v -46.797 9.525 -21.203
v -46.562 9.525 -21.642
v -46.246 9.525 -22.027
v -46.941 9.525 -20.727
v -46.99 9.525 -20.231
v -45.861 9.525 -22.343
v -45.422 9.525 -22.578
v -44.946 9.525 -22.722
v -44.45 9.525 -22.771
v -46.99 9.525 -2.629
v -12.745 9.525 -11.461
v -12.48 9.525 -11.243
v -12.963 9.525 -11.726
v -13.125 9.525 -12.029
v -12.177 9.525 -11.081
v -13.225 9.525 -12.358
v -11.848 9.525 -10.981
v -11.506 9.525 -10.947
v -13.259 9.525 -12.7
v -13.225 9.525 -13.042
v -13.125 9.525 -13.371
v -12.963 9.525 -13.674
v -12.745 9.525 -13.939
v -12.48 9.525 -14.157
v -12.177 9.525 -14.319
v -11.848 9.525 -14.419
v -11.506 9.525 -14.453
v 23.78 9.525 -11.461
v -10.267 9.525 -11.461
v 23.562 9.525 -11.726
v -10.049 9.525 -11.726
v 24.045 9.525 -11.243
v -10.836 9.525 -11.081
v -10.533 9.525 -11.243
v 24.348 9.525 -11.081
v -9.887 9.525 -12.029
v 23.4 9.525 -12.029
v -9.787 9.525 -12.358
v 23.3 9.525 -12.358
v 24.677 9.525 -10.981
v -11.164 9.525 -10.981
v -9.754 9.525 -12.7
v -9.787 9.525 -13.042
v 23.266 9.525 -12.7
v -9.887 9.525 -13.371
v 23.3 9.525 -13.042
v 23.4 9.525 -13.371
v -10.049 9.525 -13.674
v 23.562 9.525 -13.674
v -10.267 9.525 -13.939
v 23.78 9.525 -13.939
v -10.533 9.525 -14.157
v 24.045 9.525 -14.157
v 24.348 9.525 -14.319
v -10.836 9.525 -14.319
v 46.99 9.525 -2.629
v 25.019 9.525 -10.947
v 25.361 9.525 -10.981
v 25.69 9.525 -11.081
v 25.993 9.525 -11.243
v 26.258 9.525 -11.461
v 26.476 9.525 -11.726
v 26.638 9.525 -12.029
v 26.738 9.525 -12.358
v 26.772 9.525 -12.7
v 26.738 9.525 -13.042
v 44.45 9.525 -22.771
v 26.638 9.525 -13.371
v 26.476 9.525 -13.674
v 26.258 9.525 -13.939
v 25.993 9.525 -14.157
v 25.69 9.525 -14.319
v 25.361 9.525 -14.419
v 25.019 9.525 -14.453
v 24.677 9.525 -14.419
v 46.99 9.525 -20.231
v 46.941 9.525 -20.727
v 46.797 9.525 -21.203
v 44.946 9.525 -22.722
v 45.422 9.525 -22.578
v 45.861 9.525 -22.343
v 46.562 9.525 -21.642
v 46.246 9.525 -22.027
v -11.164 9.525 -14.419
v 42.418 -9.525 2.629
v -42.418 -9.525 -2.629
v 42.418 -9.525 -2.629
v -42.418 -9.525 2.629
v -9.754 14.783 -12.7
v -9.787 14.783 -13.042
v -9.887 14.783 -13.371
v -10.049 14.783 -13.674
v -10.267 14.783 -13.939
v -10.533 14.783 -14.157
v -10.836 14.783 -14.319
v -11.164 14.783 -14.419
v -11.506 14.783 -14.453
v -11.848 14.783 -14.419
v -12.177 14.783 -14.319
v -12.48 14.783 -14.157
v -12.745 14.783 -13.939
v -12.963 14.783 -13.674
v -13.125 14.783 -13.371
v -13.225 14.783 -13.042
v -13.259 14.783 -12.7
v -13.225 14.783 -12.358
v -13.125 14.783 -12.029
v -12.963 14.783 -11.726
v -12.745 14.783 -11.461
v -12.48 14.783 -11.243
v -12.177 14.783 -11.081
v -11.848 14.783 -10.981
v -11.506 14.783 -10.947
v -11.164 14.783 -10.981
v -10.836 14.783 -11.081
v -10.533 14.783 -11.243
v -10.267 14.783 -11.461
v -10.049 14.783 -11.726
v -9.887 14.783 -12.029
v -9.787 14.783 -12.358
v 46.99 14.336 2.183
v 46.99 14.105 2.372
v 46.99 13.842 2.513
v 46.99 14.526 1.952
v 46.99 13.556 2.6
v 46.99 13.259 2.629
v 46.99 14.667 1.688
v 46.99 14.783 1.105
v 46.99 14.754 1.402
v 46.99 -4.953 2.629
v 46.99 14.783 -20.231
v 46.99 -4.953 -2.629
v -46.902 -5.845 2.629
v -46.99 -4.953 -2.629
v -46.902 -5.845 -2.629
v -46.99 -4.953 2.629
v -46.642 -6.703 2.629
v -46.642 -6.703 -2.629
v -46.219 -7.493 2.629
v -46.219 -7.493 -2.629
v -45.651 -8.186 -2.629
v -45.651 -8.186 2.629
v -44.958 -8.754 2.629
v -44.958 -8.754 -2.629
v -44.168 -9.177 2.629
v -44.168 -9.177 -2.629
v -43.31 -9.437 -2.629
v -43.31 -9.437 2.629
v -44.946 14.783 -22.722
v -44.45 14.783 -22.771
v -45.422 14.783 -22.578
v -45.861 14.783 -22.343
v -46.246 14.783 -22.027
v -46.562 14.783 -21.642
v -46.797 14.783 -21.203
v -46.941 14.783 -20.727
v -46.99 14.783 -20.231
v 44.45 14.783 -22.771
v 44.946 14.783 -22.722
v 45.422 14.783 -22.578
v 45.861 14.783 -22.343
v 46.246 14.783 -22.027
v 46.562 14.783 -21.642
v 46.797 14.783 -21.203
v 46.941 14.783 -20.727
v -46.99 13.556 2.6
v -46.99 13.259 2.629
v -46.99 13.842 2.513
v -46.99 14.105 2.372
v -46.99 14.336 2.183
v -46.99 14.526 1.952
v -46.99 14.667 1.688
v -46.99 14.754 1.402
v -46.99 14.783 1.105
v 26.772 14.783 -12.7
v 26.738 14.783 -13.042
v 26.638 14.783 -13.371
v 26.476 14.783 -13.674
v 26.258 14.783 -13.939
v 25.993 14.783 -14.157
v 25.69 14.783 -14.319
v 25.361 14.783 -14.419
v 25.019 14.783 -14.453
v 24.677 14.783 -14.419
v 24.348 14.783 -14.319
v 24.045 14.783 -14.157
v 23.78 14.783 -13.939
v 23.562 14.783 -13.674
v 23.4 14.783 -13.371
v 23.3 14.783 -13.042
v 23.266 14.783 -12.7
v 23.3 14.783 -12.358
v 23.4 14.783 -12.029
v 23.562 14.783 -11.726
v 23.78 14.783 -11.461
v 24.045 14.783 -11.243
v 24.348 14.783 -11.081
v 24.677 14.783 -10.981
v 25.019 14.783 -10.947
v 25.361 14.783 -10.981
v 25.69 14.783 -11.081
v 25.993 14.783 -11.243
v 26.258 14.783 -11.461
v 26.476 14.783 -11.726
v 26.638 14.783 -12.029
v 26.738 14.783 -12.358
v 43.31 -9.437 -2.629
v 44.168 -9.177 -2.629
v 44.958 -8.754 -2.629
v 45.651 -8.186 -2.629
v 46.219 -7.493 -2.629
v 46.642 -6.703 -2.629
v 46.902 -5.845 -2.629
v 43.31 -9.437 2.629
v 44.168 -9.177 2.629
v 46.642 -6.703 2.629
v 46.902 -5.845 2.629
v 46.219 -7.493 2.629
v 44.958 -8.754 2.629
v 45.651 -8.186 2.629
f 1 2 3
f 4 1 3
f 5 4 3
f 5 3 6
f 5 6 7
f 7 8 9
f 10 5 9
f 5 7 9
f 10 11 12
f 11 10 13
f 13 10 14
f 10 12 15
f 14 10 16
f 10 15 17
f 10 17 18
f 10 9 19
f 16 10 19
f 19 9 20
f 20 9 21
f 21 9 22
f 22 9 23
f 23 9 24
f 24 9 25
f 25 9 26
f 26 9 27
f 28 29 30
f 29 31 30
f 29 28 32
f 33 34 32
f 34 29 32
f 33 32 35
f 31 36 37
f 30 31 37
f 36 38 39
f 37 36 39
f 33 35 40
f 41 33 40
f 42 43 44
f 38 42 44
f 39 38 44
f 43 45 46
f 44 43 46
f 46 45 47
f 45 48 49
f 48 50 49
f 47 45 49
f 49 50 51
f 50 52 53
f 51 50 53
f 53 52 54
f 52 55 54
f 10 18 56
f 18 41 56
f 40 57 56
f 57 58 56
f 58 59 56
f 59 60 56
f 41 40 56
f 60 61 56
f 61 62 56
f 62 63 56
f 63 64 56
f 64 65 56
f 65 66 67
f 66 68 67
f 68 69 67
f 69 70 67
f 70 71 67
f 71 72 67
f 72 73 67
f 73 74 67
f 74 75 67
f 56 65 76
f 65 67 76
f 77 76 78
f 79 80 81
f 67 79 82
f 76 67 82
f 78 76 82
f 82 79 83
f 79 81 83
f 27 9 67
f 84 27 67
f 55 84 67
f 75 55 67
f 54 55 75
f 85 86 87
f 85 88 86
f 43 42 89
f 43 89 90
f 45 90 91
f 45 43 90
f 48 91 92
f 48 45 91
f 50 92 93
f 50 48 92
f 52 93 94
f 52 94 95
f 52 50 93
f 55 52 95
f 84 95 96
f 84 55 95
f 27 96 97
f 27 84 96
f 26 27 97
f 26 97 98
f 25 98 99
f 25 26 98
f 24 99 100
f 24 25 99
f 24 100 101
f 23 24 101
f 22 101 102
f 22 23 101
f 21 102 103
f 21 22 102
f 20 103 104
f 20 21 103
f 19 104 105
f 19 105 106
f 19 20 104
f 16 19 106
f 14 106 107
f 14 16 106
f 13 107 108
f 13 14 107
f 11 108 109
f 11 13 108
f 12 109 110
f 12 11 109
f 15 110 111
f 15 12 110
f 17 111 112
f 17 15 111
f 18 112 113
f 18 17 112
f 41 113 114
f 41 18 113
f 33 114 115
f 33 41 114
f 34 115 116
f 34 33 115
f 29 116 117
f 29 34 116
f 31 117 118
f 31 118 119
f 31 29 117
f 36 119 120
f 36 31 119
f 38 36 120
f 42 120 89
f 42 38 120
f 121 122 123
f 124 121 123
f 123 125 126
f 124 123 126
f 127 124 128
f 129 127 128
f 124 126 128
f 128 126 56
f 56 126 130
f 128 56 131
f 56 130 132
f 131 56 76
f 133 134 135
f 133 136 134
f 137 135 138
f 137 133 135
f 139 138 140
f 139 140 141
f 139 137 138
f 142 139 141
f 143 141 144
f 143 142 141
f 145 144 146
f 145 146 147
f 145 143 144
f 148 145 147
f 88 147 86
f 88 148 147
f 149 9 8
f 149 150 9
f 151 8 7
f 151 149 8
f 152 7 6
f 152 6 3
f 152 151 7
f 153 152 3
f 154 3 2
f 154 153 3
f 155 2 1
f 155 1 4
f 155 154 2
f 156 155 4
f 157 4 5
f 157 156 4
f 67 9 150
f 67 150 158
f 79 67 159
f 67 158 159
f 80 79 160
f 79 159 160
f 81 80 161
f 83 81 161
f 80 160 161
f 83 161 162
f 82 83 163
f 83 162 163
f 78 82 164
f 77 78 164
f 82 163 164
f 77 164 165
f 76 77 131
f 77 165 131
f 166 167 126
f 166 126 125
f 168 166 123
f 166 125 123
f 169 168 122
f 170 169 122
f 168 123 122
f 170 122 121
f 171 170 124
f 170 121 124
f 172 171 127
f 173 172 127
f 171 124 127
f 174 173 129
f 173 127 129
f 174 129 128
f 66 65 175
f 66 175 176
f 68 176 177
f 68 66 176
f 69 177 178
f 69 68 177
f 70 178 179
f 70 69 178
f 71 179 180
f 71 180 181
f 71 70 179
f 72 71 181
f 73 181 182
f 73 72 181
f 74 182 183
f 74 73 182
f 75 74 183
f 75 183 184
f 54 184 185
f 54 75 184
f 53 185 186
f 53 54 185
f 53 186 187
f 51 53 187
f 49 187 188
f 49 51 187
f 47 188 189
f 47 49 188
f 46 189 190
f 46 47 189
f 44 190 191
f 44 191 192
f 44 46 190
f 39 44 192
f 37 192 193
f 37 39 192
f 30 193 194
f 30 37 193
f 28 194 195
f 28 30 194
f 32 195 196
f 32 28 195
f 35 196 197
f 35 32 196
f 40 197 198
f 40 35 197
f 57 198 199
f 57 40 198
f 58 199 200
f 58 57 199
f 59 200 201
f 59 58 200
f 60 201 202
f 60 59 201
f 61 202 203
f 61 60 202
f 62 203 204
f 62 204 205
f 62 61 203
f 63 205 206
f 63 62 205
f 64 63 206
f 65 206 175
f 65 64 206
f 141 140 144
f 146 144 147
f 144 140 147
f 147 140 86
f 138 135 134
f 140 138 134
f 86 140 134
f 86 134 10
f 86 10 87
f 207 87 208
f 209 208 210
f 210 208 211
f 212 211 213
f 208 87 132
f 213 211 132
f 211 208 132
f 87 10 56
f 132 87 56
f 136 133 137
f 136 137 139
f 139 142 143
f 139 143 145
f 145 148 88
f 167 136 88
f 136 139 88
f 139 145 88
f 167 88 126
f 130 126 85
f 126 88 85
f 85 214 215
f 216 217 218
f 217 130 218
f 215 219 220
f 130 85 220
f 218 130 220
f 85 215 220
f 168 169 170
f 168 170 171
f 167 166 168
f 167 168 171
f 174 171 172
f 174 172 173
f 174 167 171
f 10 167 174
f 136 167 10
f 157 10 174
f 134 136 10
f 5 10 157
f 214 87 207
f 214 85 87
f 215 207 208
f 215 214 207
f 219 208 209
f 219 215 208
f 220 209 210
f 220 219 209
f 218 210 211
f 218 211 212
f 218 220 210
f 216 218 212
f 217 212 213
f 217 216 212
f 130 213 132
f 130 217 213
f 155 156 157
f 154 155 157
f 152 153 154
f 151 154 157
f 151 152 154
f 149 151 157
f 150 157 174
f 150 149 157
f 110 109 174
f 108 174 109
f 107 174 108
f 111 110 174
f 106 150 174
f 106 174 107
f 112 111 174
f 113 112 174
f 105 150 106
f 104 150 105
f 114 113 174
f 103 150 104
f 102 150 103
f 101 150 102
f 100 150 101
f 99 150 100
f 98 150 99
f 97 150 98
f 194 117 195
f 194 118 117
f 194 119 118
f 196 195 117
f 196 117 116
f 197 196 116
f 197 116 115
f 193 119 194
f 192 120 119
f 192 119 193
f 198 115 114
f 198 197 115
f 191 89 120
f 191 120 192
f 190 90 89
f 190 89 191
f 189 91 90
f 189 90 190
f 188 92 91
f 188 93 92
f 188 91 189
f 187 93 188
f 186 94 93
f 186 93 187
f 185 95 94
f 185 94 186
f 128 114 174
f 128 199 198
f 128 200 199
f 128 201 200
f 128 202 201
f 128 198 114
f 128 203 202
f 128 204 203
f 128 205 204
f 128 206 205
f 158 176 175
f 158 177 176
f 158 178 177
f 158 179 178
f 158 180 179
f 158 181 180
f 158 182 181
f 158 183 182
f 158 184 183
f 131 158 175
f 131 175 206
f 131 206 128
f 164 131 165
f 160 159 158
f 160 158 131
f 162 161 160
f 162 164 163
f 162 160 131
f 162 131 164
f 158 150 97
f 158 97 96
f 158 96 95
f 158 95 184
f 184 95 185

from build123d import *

# Parameters (mm, degrees)
SKETCH1_W           = 93.98
SKETCH1_H           = 19.05
BOSS_EXTRUDE1_DEPTH = 2.6289
SKETCH2_W           = 93.98
SKETCH2_H           = 25.4
BOSS_EXTRUDE2_DEPTH = 5.2578
FILLET6_R           = 4.572
FILLET7_R           = 4.572
FILLET8_R           = 1.524
FILLET9_R           = 2.54
FILLET10_R          = 2.54
CAVITY1_START       = 9.525
CAVITY1_OUTLINE_R   = 1.7526
CAVITY1_DEPTH       = 5.2578


# Read off the part's stored shape, not the designer's step: Cavity1
with BuildPart() as part:
    # Sketch1 → Boss-Extrude1 (new, symmetric)
    with BuildSketch(Plane.XY):
        Rectangle(SKETCH1_W, SKETCH1_H)
    extrude(amount=BOSS_EXTRUDE1_DEPTH, both=True)

    # Sketch2 → Boss-Extrude2 (add)
    with BuildSketch(Plane(origin=(0, 9.525, 0), x_dir=(1, 0, 0), z_dir=(0, 1, 0))):
        with Locations((0, 10.0711)):
            Rectangle(SKETCH2_W, SKETCH2_H)
    extrude(amount=BOSS_EXTRUDE2_DEPTH)

    # Fillet6
    fillet6_edges = [part.edges().sort_by_distance(p)[0] for p in [
        (-46.99, -9.525, 0),
    ]]
    fillet(fillet6_edges, radius=FILLET6_R)

    # Fillet7
    fillet7_edges = [part.edges().sort_by_distance(p)[0] for p in [
        (46.99, -9.525, 0),
    ]]
    fillet(fillet7_edges, radius=FILLET7_R)

    # Fillet8
    fillet8_edges = [part.edges().sort_by_distance(p)[0] for p in [
        (0, 14.7828, 2.6289),
    ]]
    fillet(fillet8_edges, radius=FILLET8_R)

    # Fillet9
    fillet9_edges = [part.edges().sort_by_distance(p)[0] for p in [
        (-46.99, 12.1539, -22.7711),
    ]]
    fillet(fillet9_edges, radius=FILLET9_R)

    # Fillet10
    fillet10_edges = [part.edges().sort_by_distance(p)[0] for p in [
        (46.99, 12.1539, -22.7711),
    ]]
    fillet(fillet10_edges, radius=FILLET10_R)

    # Cavity1 outline → Cavity1 (cut)
    with BuildSketch(Plane(origin=(0, 0, 0), x_dir=(1, 0, 0), z_dir=(0, 1, 0)).offset(CAVITY1_START)):
        with Locations((25.019, 12.7)):
            Circle(CAVITY1_OUTLINE_R)
        with Locations((-11.5062, 12.7)):
            Circle(CAVITY1_OUTLINE_R)
    extrude(amount=CAVITY1_DEPTH, mode=Mode.SUBTRACT)


solid = part.part
